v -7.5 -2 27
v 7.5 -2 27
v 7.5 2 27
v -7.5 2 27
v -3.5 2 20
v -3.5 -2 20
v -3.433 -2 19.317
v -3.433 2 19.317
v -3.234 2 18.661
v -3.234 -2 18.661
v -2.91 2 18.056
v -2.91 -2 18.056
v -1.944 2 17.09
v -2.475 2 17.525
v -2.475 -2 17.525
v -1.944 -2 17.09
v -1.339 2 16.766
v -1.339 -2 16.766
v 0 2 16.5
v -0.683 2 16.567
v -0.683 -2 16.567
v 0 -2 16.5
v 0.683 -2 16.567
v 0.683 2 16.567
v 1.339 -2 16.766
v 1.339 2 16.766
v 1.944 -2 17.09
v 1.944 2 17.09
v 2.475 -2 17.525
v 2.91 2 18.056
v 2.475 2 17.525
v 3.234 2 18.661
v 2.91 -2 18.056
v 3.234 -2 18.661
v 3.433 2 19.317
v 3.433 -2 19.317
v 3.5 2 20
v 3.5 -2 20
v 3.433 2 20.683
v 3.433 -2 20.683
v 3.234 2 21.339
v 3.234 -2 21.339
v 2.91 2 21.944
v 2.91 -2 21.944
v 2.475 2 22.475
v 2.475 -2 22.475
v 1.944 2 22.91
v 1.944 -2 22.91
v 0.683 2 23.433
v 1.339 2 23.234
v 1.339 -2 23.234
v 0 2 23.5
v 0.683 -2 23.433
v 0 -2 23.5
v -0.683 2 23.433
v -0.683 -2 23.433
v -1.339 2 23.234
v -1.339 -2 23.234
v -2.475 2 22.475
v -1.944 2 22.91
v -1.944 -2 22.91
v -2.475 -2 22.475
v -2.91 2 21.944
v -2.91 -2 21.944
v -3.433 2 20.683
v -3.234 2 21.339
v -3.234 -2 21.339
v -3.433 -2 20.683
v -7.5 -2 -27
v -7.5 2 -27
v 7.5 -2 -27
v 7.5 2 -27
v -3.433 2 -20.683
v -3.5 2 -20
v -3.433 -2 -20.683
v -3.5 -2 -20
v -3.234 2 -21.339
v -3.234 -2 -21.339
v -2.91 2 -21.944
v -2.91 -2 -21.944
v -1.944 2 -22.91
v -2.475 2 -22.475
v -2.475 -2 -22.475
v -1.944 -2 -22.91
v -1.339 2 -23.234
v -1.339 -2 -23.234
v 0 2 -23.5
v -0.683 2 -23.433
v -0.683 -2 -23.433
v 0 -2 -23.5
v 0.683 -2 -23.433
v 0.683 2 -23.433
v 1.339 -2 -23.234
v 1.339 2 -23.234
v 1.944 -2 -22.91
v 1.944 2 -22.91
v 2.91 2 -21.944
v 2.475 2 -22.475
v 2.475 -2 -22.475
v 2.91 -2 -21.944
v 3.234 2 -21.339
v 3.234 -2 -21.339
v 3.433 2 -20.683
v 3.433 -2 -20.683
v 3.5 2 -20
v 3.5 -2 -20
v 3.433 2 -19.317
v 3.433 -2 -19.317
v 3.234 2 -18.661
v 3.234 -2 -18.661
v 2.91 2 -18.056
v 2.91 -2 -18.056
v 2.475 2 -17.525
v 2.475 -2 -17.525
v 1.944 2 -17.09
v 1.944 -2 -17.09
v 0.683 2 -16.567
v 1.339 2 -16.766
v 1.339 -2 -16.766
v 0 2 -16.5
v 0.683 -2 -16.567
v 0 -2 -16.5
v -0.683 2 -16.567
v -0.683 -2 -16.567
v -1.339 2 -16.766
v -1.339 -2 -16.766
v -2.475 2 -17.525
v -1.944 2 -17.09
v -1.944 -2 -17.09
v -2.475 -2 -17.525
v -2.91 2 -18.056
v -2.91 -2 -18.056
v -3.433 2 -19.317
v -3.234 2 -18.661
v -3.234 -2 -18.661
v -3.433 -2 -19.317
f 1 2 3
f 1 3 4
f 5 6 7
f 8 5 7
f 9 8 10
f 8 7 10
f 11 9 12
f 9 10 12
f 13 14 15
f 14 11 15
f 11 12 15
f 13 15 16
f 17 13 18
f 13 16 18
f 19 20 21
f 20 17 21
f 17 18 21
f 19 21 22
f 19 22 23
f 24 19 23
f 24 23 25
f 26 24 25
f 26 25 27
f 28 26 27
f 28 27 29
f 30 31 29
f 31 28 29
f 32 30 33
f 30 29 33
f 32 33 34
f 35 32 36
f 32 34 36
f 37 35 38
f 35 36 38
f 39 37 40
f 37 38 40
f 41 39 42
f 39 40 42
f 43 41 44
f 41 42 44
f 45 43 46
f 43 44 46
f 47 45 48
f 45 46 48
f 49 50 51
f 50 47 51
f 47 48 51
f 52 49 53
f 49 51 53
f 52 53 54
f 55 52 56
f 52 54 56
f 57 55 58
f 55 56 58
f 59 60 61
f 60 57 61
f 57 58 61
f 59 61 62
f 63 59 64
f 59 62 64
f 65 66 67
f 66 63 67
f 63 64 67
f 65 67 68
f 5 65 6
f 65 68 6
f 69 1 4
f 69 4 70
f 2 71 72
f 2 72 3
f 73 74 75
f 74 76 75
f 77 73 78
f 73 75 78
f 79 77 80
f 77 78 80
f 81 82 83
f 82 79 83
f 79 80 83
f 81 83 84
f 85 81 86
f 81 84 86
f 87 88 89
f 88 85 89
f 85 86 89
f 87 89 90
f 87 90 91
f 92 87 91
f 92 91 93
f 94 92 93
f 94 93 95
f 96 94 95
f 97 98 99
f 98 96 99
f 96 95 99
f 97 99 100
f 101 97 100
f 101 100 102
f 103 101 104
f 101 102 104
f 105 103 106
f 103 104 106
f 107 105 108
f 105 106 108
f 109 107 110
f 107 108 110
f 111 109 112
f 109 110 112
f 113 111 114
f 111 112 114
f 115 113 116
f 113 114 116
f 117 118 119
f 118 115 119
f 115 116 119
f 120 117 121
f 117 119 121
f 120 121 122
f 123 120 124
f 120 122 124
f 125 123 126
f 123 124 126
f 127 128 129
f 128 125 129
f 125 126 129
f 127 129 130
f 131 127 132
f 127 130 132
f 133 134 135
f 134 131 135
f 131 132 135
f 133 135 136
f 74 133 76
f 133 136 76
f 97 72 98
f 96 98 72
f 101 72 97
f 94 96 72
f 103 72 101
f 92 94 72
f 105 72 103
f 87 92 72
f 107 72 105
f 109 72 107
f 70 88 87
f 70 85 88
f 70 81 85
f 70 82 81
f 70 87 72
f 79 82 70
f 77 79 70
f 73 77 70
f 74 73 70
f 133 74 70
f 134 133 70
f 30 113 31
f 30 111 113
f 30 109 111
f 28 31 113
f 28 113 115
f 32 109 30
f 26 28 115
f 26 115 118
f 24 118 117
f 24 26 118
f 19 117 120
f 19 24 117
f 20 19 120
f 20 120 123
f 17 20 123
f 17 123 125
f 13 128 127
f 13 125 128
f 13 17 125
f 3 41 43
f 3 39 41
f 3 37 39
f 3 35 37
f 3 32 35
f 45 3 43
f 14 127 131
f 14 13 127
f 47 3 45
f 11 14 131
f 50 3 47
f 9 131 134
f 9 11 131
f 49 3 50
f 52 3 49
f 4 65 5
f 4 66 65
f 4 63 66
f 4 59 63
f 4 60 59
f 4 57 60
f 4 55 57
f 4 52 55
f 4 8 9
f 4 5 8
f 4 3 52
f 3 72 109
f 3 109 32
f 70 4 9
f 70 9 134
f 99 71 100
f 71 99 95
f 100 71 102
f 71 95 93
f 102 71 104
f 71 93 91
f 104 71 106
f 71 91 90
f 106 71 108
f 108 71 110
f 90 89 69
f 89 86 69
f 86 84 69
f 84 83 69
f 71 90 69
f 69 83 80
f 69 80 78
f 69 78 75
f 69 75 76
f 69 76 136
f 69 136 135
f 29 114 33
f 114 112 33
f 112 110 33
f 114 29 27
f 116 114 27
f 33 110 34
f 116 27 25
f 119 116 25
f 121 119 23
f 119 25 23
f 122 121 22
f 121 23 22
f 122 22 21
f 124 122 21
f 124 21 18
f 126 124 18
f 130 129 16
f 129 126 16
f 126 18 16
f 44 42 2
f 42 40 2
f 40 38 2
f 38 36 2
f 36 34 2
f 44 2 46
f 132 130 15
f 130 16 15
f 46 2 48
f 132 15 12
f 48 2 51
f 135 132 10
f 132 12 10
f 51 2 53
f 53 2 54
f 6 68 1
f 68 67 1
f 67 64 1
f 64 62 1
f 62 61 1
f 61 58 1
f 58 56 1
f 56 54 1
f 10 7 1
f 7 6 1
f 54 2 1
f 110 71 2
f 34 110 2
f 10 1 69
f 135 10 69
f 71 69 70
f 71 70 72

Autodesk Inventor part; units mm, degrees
ref_plane "YZ Plane" through (0, 0, 0) normal (1, 0, 0) x (0, 1, 0)
ref_plane "XZ Plane" through (0, 0, 0) normal (0, 1, 0) x (-1, 0, 0)
ref_plane "XY Plane" through (0, 0, 0) normal (0, 0, 1) x (1, 0, 0)
sketch "Sketch1" plane through (0, 0, 0) normal (0, 1, 0) x (-1, 0, 0)
  line L0 (-7.5, 27) -> (7.5, 27)
  line L1 (7.5, 27) -> (7.5, -27)
  line L2 (7.5, -27) -> (-7.5, -27)
  line L3 (-7.5, -27) -> (-7.5, 27)
  line L4 (-7.5, 27) -> (7.5, -27) construction
  line L5 (7.5, 27) -> (-7.5, -27) construction
  circle A0 centre (0, -20) radius 3.5
  circle A1 centre (0, 20) radius 3.5
  line L6 (7.5, 0) -> (0, 0)
  point P0 (0, 0)
  dimension "d0" = 7
  dimension "d1" = 15
  dimension "d2" = 54
  dimension "d3" = 40
extrude "Extrusion1" add sketch "Sketch1" along normal mid plane 4
properties part number "Планка" material "Stainless Steel"
